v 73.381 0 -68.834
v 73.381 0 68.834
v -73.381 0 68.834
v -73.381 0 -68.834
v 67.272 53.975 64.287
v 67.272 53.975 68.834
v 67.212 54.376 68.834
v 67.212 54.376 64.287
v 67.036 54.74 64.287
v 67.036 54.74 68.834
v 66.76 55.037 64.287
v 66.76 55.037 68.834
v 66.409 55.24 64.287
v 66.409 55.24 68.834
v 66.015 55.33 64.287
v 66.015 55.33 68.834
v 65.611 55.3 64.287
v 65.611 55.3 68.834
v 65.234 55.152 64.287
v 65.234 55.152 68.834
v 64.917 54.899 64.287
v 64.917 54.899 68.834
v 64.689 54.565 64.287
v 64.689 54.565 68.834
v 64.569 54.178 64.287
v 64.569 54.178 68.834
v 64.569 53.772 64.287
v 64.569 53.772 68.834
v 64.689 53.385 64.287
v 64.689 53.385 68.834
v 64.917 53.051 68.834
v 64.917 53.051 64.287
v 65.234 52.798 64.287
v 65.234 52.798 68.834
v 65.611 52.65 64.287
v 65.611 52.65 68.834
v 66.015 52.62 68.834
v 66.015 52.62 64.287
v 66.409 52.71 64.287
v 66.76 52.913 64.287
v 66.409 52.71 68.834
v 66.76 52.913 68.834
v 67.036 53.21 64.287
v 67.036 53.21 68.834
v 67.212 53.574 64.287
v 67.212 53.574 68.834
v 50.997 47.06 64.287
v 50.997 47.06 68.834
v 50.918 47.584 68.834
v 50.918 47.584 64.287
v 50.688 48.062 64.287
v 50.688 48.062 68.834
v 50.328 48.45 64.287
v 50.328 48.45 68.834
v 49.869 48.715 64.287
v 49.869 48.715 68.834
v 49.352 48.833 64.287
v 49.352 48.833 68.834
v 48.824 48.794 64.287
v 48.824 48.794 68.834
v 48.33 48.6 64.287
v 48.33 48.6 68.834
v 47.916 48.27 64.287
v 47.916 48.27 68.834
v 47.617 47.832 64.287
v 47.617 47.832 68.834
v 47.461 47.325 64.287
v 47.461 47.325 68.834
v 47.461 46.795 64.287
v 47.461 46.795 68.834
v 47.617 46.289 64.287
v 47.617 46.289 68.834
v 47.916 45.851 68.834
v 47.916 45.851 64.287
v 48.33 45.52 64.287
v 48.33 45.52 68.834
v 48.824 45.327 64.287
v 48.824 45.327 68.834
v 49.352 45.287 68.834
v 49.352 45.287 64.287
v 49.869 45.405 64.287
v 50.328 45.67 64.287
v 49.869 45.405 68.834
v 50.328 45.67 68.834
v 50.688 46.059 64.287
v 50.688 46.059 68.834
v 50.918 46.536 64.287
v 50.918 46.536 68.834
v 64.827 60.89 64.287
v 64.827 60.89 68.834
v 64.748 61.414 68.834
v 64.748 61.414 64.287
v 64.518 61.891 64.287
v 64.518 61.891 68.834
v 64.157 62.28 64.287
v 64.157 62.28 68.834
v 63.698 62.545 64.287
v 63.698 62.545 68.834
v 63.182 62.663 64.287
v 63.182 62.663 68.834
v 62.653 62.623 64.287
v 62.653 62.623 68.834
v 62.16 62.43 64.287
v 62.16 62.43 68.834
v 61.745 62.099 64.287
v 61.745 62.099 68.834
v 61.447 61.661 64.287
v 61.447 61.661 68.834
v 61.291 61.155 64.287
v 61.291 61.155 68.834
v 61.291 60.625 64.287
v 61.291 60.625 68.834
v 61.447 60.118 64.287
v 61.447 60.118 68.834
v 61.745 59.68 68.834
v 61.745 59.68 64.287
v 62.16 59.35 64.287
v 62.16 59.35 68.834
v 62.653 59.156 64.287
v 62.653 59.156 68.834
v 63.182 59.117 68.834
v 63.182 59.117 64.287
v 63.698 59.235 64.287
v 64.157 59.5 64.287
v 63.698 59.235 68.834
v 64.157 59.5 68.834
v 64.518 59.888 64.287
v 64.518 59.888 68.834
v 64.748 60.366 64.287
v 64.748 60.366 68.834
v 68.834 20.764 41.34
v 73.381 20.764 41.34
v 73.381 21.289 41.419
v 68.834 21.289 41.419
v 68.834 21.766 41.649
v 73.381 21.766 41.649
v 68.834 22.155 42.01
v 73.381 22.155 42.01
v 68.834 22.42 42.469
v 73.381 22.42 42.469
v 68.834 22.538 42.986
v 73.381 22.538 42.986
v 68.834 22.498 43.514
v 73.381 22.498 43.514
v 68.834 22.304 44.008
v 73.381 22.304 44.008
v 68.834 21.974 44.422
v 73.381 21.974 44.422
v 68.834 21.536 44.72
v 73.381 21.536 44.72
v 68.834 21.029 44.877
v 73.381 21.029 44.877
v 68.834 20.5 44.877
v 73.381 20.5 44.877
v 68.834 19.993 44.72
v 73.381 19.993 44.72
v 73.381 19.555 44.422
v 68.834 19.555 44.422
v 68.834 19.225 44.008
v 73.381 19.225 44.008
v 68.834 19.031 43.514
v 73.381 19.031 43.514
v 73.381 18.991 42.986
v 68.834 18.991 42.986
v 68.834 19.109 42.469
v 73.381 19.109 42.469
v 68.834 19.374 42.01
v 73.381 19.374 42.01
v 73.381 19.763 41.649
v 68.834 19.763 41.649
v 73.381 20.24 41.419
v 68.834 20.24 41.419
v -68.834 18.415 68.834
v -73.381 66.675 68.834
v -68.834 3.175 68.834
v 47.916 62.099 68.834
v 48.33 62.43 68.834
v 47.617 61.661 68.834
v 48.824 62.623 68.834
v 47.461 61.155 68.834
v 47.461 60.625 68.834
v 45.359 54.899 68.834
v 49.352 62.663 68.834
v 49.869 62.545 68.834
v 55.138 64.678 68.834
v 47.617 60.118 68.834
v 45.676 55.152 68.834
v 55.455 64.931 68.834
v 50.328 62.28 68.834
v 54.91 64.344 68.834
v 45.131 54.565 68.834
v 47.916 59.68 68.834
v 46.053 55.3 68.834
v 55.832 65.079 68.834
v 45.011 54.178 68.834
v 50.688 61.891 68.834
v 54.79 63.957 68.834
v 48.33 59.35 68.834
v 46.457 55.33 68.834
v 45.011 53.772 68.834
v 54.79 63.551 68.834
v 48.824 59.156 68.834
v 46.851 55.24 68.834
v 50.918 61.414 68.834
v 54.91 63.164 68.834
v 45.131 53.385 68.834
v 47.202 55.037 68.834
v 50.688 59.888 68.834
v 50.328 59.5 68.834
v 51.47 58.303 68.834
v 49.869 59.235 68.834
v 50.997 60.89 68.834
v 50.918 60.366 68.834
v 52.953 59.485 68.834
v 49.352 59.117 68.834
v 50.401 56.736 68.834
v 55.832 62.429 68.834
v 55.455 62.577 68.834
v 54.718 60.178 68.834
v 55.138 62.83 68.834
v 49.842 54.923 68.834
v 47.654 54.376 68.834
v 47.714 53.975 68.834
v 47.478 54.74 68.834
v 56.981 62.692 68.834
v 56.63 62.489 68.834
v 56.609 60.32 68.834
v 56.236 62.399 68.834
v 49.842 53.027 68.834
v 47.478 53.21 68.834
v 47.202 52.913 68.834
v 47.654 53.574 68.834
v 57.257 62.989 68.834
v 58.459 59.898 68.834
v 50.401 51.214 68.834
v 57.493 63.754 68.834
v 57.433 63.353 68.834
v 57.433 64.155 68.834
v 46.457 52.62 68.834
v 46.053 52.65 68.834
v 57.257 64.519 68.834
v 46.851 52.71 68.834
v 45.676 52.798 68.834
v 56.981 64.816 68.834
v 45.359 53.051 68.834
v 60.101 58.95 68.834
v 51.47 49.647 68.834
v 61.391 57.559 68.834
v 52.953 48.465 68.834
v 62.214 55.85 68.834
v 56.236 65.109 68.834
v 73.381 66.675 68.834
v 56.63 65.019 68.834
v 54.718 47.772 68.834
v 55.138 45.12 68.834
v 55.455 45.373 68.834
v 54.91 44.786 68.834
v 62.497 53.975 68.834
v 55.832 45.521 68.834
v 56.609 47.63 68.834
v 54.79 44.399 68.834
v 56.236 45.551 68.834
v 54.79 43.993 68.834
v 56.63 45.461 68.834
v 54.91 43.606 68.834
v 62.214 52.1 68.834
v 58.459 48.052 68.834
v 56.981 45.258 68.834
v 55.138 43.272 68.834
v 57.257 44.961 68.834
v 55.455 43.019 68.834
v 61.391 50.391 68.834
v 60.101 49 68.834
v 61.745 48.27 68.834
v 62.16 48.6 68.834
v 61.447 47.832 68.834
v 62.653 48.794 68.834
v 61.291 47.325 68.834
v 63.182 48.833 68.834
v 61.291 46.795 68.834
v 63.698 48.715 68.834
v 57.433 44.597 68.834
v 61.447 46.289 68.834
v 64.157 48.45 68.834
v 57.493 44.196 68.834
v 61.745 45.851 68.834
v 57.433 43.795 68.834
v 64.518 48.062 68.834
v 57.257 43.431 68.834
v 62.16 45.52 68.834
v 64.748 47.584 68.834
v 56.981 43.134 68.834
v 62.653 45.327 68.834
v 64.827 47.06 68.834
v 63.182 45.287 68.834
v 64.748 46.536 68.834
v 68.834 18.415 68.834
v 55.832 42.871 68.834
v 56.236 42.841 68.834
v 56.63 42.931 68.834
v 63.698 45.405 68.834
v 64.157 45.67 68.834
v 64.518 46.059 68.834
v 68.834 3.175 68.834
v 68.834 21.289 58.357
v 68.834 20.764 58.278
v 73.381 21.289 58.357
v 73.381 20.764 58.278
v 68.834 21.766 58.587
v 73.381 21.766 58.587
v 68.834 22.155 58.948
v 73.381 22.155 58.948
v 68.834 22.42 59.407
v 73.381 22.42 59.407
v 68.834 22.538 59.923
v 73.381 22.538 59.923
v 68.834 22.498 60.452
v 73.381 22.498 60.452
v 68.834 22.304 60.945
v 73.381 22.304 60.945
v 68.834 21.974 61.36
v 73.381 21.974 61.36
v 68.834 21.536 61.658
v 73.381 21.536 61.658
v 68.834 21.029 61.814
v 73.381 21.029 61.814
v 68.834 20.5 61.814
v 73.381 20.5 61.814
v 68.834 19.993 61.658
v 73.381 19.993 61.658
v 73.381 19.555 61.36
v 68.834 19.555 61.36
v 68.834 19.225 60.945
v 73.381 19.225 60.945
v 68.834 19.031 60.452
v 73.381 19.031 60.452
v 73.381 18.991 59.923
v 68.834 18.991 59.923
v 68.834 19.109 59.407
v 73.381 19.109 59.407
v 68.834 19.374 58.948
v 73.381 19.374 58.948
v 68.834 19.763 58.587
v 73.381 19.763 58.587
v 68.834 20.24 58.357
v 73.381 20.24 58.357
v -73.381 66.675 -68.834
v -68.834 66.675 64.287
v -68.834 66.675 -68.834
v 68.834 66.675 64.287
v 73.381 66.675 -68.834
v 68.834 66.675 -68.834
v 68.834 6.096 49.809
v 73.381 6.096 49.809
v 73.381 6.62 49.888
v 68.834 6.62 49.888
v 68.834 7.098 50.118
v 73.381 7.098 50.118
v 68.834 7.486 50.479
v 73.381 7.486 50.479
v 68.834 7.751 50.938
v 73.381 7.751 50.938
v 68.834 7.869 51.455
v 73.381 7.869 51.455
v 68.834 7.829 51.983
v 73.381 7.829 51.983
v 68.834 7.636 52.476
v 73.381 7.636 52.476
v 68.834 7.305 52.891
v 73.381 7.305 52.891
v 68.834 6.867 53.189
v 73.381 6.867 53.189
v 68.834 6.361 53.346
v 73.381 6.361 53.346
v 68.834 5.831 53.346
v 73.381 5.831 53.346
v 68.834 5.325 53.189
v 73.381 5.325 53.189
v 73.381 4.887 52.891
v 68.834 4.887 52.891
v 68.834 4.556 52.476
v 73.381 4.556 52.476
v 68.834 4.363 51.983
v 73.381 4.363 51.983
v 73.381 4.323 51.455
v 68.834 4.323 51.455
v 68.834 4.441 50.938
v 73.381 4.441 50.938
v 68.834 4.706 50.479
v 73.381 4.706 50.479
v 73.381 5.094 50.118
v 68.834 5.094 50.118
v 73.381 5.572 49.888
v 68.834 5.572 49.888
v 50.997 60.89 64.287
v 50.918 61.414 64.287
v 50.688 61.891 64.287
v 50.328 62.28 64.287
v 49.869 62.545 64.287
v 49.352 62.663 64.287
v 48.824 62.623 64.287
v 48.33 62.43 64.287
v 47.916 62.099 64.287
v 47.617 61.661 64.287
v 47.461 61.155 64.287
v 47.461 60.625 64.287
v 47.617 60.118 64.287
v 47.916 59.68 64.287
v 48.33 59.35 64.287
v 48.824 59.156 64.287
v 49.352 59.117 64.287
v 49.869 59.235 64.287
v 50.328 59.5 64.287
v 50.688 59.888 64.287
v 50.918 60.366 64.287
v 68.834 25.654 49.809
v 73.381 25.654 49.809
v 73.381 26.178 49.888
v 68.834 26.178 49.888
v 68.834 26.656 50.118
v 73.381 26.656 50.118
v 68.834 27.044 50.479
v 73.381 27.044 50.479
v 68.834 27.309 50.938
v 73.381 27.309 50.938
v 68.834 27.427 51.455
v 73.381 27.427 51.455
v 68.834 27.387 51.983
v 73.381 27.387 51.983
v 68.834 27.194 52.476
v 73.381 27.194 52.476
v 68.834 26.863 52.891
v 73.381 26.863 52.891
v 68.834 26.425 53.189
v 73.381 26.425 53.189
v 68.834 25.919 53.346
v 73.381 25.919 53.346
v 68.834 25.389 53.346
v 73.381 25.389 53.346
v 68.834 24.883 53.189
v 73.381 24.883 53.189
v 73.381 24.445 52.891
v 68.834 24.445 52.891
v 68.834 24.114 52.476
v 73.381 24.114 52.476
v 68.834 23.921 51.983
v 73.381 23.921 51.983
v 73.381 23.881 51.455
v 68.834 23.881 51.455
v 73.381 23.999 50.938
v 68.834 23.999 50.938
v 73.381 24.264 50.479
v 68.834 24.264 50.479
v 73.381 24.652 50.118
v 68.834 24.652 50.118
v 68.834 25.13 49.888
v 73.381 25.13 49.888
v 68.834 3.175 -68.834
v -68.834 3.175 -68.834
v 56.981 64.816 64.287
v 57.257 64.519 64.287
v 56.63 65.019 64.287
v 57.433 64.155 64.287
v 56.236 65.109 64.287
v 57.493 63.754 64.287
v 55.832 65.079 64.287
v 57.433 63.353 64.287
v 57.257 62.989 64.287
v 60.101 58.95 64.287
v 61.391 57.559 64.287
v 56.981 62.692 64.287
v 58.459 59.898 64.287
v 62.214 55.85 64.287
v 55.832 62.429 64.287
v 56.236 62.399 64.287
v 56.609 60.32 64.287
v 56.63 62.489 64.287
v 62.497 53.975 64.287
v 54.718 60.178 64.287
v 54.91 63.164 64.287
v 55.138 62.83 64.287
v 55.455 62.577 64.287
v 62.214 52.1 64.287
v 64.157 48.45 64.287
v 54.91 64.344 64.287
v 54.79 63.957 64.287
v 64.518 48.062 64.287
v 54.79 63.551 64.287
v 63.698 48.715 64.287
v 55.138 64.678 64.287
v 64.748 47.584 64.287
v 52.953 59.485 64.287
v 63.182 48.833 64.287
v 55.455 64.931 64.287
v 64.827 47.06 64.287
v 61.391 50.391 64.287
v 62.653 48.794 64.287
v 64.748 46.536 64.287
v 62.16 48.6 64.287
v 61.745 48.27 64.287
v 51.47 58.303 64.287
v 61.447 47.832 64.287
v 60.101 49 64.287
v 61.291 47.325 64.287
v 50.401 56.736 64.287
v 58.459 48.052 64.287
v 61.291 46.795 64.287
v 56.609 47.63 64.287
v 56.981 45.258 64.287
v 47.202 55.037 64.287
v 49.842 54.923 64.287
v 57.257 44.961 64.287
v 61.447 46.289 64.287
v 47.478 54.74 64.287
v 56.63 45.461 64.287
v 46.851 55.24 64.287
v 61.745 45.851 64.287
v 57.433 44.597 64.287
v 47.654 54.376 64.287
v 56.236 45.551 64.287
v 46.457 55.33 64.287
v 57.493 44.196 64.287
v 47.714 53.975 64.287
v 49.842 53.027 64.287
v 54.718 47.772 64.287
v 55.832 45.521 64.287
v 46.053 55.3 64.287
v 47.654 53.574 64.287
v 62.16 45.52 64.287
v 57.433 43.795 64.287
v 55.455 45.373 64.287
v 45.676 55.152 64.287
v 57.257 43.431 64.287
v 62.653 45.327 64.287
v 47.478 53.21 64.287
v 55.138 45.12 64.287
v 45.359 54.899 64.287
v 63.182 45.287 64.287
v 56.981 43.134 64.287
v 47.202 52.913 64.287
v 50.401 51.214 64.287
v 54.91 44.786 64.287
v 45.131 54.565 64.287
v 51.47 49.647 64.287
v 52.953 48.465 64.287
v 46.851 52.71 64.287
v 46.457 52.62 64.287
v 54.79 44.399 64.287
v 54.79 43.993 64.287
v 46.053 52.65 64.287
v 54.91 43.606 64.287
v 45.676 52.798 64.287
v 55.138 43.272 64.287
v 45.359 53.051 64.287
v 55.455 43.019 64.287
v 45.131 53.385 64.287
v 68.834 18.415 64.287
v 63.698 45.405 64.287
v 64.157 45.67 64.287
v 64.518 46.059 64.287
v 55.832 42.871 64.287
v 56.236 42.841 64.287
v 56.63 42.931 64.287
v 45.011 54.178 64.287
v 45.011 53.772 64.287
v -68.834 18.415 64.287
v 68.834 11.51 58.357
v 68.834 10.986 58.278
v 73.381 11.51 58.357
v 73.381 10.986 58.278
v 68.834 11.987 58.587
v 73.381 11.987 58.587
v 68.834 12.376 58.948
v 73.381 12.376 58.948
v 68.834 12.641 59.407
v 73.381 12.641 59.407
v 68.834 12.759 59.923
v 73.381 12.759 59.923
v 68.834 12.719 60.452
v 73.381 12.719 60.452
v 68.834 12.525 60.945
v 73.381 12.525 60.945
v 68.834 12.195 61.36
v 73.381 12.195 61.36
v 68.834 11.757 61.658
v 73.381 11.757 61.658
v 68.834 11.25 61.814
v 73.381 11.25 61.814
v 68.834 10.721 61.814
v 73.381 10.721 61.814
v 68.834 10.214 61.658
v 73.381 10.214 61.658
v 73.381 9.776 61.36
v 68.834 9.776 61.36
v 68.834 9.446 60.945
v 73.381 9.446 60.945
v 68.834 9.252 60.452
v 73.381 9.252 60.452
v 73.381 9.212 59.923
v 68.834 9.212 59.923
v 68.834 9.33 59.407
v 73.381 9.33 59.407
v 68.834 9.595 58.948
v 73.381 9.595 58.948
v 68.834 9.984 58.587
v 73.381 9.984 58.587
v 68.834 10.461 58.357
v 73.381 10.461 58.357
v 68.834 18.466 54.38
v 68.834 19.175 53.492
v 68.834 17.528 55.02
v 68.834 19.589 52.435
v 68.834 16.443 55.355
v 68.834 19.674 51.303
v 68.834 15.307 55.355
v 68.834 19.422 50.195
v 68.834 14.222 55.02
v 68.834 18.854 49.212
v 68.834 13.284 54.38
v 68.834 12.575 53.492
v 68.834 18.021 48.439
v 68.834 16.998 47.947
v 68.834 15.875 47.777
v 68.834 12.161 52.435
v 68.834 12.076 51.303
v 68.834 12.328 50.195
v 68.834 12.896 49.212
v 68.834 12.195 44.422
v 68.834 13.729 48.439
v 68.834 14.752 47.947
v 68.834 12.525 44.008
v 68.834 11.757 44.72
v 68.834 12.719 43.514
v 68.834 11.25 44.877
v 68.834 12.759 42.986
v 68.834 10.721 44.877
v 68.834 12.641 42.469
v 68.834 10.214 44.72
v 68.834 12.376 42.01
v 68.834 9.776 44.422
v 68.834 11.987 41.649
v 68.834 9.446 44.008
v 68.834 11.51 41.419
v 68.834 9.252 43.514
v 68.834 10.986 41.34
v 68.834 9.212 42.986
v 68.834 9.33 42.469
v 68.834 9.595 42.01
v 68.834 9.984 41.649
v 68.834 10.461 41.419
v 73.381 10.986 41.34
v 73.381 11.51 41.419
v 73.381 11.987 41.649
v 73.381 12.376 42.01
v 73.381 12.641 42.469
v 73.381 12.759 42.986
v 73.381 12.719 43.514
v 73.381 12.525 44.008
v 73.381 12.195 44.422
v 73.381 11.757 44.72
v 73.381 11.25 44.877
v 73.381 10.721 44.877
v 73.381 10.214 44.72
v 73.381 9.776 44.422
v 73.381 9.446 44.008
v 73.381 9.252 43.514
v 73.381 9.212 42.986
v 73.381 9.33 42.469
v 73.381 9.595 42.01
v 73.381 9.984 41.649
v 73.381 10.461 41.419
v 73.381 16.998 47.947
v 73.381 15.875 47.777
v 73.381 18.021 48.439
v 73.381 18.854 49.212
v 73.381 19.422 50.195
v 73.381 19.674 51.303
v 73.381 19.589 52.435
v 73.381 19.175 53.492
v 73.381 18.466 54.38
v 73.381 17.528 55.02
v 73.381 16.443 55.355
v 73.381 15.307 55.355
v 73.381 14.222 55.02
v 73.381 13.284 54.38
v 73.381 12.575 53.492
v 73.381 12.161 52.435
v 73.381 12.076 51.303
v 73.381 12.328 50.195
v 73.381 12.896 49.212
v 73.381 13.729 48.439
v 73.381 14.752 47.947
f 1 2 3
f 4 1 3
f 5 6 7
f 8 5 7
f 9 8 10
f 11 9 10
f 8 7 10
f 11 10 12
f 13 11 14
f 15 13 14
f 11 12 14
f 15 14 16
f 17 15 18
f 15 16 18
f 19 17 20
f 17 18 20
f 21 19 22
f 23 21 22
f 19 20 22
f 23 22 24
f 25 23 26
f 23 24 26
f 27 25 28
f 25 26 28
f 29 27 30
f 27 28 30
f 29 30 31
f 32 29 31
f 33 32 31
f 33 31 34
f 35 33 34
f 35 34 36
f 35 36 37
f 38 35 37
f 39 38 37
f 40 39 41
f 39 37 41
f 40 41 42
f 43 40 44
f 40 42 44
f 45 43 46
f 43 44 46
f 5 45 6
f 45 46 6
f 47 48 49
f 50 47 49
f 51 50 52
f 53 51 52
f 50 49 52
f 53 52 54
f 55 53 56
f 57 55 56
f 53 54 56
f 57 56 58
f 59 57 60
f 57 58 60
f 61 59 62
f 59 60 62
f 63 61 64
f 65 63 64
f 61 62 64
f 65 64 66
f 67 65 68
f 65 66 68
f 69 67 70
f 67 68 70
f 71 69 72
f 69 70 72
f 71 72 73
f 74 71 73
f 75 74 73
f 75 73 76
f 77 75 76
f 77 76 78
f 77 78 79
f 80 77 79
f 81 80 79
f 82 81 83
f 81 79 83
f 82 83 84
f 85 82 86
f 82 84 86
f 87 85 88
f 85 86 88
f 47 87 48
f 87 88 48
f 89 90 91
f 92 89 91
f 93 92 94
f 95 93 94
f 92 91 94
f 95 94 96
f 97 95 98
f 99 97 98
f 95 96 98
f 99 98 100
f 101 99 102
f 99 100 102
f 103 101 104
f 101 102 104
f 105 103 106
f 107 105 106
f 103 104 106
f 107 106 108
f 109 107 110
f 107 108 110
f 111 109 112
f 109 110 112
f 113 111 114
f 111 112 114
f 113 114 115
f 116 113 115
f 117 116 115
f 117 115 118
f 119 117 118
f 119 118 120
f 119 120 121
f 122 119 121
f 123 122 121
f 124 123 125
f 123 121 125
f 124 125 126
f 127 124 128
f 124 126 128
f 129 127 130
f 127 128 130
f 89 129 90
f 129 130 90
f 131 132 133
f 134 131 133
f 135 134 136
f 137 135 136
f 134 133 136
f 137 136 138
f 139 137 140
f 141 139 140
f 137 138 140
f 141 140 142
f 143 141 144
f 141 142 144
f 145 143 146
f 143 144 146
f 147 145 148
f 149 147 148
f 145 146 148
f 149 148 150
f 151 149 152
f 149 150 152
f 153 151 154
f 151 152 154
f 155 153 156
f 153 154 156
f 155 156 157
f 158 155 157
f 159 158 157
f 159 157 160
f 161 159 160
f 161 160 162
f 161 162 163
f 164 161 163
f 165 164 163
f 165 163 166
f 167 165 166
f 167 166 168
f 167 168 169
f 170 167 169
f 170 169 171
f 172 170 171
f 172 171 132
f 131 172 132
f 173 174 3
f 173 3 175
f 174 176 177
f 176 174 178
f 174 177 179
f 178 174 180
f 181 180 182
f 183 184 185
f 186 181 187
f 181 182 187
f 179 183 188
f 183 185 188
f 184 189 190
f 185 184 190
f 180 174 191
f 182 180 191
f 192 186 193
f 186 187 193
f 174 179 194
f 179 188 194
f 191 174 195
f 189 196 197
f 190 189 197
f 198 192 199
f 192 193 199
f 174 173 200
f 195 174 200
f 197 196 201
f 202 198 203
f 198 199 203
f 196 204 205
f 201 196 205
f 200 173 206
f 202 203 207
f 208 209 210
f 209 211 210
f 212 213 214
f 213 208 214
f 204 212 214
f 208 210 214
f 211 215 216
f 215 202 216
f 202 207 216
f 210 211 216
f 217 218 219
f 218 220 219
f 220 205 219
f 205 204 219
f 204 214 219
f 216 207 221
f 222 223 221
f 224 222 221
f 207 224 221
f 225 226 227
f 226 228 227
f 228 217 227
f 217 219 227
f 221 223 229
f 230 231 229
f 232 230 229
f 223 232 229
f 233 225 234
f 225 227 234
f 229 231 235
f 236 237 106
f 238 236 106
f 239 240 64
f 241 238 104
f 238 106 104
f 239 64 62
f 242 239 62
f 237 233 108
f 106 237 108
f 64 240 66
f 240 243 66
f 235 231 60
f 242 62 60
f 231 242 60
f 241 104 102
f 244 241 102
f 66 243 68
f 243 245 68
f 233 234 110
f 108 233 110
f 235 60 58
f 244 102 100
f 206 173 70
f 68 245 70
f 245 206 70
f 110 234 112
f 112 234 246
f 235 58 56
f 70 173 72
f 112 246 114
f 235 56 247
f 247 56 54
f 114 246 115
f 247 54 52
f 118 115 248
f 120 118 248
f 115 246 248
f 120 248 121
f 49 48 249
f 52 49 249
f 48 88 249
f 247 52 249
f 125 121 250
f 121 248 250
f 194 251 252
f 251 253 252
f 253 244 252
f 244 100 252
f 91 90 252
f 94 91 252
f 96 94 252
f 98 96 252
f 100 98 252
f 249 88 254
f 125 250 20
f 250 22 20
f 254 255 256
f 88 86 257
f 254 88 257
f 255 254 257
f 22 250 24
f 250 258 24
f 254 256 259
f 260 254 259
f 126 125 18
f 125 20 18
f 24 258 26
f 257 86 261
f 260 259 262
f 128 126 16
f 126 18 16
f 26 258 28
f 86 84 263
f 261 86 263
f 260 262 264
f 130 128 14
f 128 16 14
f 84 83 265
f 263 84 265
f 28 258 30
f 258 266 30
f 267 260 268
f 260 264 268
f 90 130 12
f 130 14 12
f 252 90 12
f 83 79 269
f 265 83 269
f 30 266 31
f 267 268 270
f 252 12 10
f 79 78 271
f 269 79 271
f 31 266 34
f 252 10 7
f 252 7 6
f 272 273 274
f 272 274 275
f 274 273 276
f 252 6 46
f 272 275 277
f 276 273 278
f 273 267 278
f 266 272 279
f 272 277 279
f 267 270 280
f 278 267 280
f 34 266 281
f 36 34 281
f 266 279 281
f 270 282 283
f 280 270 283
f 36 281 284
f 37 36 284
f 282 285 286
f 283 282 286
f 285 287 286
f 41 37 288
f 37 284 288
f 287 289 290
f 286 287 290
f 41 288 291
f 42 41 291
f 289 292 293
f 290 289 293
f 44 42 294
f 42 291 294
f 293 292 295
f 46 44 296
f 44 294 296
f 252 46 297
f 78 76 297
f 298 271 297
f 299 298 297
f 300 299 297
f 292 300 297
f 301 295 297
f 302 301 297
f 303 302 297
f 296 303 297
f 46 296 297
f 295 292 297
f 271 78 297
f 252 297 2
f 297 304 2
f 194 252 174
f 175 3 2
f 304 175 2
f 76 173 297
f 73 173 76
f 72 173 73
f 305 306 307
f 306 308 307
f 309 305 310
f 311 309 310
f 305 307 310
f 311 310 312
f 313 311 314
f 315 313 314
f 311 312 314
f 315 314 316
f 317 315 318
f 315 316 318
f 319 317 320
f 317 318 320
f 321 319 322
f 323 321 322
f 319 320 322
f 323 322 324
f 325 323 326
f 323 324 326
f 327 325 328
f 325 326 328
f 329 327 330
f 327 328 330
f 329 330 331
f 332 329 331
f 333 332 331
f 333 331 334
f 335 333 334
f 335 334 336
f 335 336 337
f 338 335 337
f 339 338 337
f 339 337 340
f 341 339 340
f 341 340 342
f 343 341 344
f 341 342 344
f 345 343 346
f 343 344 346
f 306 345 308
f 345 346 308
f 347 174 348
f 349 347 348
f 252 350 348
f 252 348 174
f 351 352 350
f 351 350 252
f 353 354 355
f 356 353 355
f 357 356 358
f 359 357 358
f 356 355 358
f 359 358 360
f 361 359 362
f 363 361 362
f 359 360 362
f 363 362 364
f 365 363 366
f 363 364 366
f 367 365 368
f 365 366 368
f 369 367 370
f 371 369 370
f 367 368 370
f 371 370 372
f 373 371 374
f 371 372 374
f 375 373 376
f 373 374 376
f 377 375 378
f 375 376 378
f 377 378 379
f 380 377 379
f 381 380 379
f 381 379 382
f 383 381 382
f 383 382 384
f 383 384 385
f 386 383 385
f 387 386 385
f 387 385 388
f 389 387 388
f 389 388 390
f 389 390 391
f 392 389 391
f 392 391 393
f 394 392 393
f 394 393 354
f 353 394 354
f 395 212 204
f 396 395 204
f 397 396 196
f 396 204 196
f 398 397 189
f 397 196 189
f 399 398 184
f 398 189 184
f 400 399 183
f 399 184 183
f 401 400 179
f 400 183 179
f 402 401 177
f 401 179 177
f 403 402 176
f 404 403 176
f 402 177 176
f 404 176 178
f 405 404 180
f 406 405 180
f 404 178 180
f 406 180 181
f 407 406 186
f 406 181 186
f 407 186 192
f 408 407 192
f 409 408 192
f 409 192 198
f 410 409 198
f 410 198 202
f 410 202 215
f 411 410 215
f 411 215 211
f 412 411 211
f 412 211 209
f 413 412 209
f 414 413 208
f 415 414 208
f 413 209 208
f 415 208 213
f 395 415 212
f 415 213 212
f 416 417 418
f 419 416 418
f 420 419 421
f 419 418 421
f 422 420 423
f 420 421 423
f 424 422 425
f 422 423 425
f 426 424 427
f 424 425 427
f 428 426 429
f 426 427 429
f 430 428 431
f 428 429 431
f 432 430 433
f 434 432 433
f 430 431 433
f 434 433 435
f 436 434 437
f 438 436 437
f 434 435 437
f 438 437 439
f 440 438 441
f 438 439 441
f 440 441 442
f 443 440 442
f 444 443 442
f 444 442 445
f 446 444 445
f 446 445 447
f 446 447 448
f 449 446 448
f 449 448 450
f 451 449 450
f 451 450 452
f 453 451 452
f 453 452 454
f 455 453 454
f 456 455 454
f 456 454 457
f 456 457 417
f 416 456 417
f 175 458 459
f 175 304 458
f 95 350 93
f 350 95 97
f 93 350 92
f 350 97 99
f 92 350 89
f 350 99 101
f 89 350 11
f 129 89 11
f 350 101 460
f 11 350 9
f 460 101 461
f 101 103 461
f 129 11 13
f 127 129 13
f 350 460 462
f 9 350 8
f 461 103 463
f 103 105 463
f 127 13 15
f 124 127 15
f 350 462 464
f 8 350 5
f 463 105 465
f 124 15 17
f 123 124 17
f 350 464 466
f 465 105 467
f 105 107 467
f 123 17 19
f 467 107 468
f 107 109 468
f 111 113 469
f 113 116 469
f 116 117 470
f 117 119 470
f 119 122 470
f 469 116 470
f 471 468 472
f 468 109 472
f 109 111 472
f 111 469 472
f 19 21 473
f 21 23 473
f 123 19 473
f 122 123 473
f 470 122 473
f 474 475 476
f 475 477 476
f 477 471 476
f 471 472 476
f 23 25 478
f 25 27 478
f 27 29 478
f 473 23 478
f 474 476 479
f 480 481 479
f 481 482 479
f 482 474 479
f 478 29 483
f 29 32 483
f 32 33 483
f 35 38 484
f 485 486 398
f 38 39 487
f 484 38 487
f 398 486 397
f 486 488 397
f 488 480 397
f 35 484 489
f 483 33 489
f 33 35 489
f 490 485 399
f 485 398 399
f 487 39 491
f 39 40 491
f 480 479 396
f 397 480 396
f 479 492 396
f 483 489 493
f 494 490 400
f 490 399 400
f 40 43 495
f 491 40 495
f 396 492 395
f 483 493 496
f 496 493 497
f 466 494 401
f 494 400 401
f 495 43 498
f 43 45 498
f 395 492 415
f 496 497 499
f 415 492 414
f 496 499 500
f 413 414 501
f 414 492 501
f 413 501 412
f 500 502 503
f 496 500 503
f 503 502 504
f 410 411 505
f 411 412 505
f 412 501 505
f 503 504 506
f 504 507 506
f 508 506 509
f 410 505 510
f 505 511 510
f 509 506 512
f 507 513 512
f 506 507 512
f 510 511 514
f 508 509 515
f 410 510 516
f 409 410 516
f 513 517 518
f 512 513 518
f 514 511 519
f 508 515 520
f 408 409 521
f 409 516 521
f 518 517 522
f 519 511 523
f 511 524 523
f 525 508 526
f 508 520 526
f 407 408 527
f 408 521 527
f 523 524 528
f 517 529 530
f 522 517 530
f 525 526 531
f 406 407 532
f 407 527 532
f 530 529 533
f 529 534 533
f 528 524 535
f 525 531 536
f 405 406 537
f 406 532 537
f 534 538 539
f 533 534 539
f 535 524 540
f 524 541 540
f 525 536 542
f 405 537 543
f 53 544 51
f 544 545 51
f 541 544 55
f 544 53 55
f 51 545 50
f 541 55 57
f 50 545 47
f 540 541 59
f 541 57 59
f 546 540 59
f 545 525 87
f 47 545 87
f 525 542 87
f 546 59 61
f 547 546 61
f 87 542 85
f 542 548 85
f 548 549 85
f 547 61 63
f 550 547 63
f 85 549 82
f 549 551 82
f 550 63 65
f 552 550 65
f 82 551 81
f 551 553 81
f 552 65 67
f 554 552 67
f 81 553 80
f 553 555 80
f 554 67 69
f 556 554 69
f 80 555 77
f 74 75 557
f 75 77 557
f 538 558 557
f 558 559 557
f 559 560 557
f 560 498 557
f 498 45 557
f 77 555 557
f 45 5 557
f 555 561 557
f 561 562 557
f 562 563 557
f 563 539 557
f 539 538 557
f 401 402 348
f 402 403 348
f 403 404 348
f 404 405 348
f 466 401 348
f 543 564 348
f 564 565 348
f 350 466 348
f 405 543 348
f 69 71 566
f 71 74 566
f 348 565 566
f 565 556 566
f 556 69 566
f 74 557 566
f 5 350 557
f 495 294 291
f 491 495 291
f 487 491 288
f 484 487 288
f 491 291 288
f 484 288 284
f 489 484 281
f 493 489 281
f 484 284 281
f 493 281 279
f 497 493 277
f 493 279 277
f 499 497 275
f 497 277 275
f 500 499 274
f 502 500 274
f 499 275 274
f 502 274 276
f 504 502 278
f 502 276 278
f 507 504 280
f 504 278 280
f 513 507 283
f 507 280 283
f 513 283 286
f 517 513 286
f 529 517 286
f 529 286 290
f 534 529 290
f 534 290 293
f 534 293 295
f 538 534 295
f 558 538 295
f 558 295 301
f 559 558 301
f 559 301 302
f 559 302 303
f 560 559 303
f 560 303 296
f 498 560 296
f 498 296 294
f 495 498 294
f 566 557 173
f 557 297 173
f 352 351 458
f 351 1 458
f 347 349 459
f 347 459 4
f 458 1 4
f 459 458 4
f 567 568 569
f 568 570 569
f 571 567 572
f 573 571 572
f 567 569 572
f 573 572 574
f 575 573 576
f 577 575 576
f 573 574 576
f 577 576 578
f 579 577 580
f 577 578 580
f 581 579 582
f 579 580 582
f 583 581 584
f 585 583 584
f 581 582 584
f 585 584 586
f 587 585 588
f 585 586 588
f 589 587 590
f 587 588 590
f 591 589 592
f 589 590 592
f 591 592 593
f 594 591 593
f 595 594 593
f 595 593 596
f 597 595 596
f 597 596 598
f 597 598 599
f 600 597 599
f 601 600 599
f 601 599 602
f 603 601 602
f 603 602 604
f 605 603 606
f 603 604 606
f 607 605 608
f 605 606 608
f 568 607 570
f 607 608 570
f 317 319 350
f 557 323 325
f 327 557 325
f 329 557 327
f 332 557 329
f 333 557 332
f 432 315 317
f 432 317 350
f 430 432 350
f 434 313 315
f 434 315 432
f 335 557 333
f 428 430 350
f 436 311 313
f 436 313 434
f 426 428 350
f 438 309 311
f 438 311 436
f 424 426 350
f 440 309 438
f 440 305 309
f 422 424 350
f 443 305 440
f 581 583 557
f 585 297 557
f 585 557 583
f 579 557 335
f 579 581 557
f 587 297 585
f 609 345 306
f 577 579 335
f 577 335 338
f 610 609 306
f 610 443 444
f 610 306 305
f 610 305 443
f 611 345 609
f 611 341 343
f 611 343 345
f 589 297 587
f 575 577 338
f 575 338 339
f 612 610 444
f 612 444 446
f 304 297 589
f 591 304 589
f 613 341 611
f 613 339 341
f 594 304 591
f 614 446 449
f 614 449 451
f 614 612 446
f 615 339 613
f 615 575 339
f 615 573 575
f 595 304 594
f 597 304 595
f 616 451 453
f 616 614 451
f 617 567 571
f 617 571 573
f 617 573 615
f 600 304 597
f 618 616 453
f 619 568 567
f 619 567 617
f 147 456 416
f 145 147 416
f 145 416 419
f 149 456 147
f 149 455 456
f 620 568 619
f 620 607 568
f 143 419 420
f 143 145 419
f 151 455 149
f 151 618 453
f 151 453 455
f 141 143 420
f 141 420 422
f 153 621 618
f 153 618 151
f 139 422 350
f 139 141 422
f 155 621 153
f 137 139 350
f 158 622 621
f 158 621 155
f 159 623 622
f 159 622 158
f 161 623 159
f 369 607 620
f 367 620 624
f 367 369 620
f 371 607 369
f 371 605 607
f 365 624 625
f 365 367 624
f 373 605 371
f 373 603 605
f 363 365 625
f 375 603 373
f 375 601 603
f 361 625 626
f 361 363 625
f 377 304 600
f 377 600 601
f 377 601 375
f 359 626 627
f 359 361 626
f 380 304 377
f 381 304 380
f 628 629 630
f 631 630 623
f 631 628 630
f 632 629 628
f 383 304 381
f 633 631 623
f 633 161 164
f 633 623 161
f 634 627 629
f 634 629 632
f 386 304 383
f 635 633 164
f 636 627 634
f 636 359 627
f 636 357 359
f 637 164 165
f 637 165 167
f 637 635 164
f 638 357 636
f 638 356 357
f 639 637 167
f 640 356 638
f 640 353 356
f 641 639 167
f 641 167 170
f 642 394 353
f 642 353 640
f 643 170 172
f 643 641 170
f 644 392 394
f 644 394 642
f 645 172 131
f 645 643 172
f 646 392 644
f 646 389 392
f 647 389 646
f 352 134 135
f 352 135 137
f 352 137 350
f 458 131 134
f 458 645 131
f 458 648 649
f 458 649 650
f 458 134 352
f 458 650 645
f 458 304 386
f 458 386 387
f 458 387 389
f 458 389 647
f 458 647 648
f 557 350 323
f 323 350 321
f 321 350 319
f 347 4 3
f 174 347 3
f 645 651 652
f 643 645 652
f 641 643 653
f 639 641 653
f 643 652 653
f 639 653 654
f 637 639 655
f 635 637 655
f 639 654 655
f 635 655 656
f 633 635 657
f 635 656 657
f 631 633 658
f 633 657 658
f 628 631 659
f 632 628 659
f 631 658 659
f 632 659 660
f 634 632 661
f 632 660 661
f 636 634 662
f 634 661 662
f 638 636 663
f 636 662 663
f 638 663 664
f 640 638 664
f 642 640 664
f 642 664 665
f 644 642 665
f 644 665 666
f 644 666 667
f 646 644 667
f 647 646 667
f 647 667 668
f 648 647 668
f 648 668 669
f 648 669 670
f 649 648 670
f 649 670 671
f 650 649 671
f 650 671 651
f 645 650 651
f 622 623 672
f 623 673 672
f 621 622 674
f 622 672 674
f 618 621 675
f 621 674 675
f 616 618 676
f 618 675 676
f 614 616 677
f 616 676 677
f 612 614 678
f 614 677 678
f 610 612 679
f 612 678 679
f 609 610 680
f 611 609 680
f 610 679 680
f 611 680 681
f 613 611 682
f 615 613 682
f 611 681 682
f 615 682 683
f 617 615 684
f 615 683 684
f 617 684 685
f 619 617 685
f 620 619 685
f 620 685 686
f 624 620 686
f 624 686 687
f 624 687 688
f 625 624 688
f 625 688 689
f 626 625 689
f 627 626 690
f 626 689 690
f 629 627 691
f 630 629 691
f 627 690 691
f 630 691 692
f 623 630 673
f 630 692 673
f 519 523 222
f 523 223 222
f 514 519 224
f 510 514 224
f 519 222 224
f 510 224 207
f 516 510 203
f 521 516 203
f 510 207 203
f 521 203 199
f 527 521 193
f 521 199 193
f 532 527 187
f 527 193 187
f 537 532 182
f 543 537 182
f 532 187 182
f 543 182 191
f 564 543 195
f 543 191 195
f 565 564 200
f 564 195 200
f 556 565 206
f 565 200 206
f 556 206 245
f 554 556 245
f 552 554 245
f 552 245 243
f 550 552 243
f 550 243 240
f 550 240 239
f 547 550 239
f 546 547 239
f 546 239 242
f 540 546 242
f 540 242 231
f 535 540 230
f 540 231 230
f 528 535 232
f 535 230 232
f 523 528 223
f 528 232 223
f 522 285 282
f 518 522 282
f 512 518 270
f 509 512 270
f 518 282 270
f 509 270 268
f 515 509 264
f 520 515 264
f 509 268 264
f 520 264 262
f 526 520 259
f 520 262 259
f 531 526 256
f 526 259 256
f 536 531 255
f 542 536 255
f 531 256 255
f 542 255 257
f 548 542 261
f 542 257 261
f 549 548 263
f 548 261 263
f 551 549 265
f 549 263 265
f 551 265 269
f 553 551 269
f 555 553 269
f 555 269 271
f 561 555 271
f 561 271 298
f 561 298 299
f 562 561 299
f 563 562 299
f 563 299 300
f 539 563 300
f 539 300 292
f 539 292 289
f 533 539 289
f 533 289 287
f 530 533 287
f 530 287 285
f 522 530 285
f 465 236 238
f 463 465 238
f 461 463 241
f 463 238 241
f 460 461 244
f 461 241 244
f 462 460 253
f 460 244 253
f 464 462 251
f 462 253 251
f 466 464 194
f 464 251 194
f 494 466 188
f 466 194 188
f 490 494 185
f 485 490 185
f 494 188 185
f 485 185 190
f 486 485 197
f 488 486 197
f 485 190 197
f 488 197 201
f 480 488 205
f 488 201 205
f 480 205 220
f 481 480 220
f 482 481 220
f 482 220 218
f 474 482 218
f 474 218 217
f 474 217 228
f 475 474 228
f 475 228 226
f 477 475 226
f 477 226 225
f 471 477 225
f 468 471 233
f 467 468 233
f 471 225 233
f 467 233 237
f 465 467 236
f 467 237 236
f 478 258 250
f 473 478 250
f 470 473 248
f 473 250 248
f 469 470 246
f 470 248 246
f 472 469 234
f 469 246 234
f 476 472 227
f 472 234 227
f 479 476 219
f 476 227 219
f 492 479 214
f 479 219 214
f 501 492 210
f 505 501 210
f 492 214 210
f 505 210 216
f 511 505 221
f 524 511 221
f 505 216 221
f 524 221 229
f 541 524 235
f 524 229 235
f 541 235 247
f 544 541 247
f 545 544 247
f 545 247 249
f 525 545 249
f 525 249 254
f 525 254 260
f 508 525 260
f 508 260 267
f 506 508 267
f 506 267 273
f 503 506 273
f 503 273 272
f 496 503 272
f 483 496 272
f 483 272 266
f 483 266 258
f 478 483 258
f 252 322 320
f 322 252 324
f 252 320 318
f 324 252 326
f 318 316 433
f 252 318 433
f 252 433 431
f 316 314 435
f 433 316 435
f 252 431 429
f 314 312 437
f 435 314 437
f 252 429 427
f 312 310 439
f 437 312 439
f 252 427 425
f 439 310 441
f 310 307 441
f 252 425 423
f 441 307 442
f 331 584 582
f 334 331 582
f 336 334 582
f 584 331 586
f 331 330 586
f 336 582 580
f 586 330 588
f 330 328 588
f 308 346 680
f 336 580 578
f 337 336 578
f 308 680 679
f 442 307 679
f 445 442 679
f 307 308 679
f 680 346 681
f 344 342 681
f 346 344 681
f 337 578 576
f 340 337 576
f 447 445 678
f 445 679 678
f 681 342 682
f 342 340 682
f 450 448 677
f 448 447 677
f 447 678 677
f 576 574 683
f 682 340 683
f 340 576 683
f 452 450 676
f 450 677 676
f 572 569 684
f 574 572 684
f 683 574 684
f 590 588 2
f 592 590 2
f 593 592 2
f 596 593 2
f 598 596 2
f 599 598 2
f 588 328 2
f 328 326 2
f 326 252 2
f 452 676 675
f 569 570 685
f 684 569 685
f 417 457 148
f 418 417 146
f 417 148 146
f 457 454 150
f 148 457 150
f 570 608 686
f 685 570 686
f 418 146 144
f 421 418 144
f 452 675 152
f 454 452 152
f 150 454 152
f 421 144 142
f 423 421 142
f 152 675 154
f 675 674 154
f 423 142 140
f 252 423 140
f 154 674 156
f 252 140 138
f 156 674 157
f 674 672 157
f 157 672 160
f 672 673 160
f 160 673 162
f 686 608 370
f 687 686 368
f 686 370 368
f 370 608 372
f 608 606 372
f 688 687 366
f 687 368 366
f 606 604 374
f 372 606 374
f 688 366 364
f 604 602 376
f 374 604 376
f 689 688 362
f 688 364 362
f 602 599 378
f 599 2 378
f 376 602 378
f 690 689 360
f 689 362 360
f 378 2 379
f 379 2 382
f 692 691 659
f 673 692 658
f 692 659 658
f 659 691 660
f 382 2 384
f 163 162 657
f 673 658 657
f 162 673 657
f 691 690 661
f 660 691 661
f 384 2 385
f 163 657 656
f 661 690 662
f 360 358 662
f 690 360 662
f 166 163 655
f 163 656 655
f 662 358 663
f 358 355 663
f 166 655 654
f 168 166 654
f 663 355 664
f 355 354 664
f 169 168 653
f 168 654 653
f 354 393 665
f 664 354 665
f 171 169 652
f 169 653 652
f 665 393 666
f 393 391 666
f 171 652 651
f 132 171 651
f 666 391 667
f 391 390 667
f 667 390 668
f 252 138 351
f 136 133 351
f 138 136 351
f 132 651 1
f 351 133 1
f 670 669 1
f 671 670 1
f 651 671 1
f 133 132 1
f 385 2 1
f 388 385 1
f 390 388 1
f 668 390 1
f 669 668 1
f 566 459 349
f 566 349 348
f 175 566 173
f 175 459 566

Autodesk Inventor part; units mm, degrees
ref_plane "YZ Plane" through (0, 0, 0) normal (1, 0, 0) x (0, 1, 0)
ref_plane "XZ Plane" through (0, 0, 0) normal (0, 1, 0) x (-1, 0, 0)
ref_plane "XY Plane" through (0, 0, 0) normal (0, 0, 1) x (1, 0, 0)
sketch "Sketch1" plane through (0, 0, 0) normal (0, 1, 0) x (-1, 0, 0)
  line L0 (73.3806, 68.834) -> (-73.3806, 68.834)
  line L1 (-73.3806, 68.834) -> (-73.3806, -68.834)
  line L2 (-73.3806, -68.834) -> (73.3806, -68.834)
  line L3 (73.3806, -68.834) -> (73.3806, 68.834)
  line L4 (73.3806, 68.834) -> (-73.3806, -68.834) construction
  line L5 (-73.3806, 68.834) -> (73.3806, -68.834) construction
  point P0 (0, 0)
  dimension "d0" = 146.7612
  dimension "d1" = 137.668
extrude "Extrusion1" add sketch "Sketch1" along normal blind 3.175
sketch "Sketch2" plane through (0, 3.175, 0) normal (0, 1, 0) x (1, 0, 0)
  line L0 (73.3806, 68.834) -> (-73.3806, 68.834) projected
  line L1 (-68.834, -68.834) -> (68.834, -68.834)
  line L2 (68.834, -68.834) -> (68.834, 68.834)
  line L3 (68.834, 68.834) -> (-68.834, 68.834)
  line L4 (-68.834, 68.834) -> (-68.834, -68.834)
  line L5 (-68.834, -68.834) -> (68.834, 68.834) construction
  line L6 (68.834, -68.834) -> (-68.834, 68.834) construction
  line L7 (73.3806, -68.834) -> (73.3806, 68.834) projected
  line L8 (73.3806, 68.834) -> (68.834, 68.834)
  line L9 (68.834, 68.834) -> (68.834, -68.834)
  line L10 (68.834, -68.834) -> (73.3806, -68.834)
  line L11 (73.3806, -68.834) -> (73.3806, 68.834)
  line L12 (-73.3806, 68.834) -> (-68.834, 68.834)
  line L13 (-68.834, 68.834) -> (-68.834, -68.834)
  line L14 (-68.834, -68.834) -> (-73.3806, -68.834)
  line L15 (-73.3806, -68.834) -> (-73.3806, 68.834)
  point P0 (0, 0)
  dimension "d4" = 137.668
extrude "Extrusion2" add sketch "Sketch2" along normal blind 63.5 contours L7 L10 L2 L0 | L4 L14 L15 L0
sketch "Sketch3" plane through (0, 3.175, 0) normal (0, 1, 0) x (1, 0, 0)
  line L0 (-68.834, -68.834) -> (68.834, -68.834) projected
  line L1 (68.834, 68.834) -> (68.834, -68.834) projected
  line L2 (-68.834, -68.834) -> (68.834, -68.834)
  line L3 (68.834, -68.834) -> (68.834, -64.2874)
  line L4 (68.834, -64.2874) -> (-68.834, -64.2874)
  line L5 (-68.834, -64.2874) -> (-68.834, -68.834)
  point P0 (0, 0)
  dimension "d7" = 4.5466
extrude "Extrusion3" add sketch "Sketch3" along normal blind 63.5
sketch "Sketch4" plane through (-73.3806, 0, 68.834) normal (0, 0, 1) x (1, 0, 0)
  line L0 (142.2146, 3.175) -> (4.5466, 3.175) projected
  line L1 (142.2146, 3.175) -> (142.2146, 66.675) projected
  line L2 (4.5466, 3.175) -> (142.2146, 3.175)
  line L3 (142.2146, 3.175) -> (142.2146, 18.415)
  line L4 (142.2146, 18.415) -> (4.5466, 18.415)
  line L5 (4.5466, 18.415) -> (4.5466, 3.175)
  point P0 (73.3806, 0)
  dimension "d10" = 15.24
extrude "Extrusion4" cut sketch "Sketch4" against normal blind 25.4
sketch "Sketch5" plane through (73.3806, 0, 68.834) normal (1, 0, 0) x (0, 0, -1)
  line L0 (4.5466, 66.675) -> (4.5466, 18.415) projected
  line L1 (4.5466, 20.7271) -> (4.5466, 3.175)
  line L2 (0, 3.175) -> (137.668, 3.175) projected
  line L3 (4.5466, 3.175) -> (29.9466, 3.175)
  line L4 (29.9466, 3.175) -> (29.9466, 28.575)
  line L5 (29.9466, 28.575) -> (4.5466, 28.575)
  line L6 (4.5466, 28.575) -> (4.5466, 3.175)
  circle A0 centre (17.2466, 15.875) radius 12.7
  circle A1 centre (17.2466, 15.875) radius 3.81
  line L7 (17.2466, 15.875) -> (17.2466, 25.654)
  circle A2 centre (17.2466, 25.654) radius 1.778
  circle A3 centre (8.7777, 20.7645) radius 1.778
  circle A4 centre (8.7777, 10.9855) radius 1.778
  circle A5 centre (17.2466, 6.096) radius 1.778
  circle A6 centre (25.7155, 10.9855) radius 1.778
  circle A7 centre (25.7155, 20.7645) radius 1.778
  point P0 (68.834, 0)
  dimension "d13" = 25.4
  dimension "d14" = 25.4
  dimension "d15" = 25.4
  dimension "d16" = 7.62
  dimension "d17" = 9.779
  dimension "d18" = 3.556
  dimension "d21" = 360
extrude "Extrusion5" cut sketch "Sketch5" against normal blind 25.4 contours A1 | A2 | A3 | A4 | A5 | A6 | A7
sketch "Sketch6" plane through (-73.3806, 0, 68.834) normal (0, 0, 1) x (1, 0, 0)
  line L0 (142.2146, 18.415) -> (142.2146, 66.675) projected
  line L1 (142.2146, 66.675) -> (116.8146, 66.675)
  line L2 (116.8146, 66.675) -> (116.8146, 41.275)
  line L3 (116.8146, 41.275) -> (142.2146, 41.275)
  line L4 (142.2146, 41.275) -> (142.2146, 66.675)
  circle A0 centre (129.5146, 53.975) radius 6.3627
  line L5 (129.5146, 53.975) -> (129.5146, 63.754)
  circle A1 centre (129.5146, 63.754) radius 1.3589
  circle A2 centre (119.7356, 53.975) radius 1.3589
  circle A3 centre (129.5146, 44.196) radius 1.3589
  circle A4 centre (139.2936, 53.975) radius 1.3589
  line L6 (129.5146, 53.975) -> (116.8146, 66.675)
  line L7 (129.5146, 53.975) -> (122.5998, 60.8898)
  circle A5 centre (122.5998, 60.8898) radius 1.778
  circle A6 centre (122.5998, 47.0602) radius 1.778
  circle A7 centre (136.4294, 47.0602) radius 1.778
  circle A8 centre (136.4294, 60.8898) radius 1.778
  point P0 (73.3806, 0)
  dimension "d25" = 25.4
  dimension "d26" = 25.4
  dimension "d27" = 12.7254
  dimension "d28" = 9.779
  dimension "d29" = 2.7178
  dimension "d32" = 360
  dimension "d34" = 9.779
  dimension "d35" = 3.556
  dimension "d38" = 360
extrude "Extrusion6" cut sketch "Sketch6" against normal blind 25.4 contours A1 | A0 L5 L6 | L6 L5 A0 | A5 L6 | L6 A5 | A2 | A3 | A4 | A6 | A7 | A8
properties part number "Box"
